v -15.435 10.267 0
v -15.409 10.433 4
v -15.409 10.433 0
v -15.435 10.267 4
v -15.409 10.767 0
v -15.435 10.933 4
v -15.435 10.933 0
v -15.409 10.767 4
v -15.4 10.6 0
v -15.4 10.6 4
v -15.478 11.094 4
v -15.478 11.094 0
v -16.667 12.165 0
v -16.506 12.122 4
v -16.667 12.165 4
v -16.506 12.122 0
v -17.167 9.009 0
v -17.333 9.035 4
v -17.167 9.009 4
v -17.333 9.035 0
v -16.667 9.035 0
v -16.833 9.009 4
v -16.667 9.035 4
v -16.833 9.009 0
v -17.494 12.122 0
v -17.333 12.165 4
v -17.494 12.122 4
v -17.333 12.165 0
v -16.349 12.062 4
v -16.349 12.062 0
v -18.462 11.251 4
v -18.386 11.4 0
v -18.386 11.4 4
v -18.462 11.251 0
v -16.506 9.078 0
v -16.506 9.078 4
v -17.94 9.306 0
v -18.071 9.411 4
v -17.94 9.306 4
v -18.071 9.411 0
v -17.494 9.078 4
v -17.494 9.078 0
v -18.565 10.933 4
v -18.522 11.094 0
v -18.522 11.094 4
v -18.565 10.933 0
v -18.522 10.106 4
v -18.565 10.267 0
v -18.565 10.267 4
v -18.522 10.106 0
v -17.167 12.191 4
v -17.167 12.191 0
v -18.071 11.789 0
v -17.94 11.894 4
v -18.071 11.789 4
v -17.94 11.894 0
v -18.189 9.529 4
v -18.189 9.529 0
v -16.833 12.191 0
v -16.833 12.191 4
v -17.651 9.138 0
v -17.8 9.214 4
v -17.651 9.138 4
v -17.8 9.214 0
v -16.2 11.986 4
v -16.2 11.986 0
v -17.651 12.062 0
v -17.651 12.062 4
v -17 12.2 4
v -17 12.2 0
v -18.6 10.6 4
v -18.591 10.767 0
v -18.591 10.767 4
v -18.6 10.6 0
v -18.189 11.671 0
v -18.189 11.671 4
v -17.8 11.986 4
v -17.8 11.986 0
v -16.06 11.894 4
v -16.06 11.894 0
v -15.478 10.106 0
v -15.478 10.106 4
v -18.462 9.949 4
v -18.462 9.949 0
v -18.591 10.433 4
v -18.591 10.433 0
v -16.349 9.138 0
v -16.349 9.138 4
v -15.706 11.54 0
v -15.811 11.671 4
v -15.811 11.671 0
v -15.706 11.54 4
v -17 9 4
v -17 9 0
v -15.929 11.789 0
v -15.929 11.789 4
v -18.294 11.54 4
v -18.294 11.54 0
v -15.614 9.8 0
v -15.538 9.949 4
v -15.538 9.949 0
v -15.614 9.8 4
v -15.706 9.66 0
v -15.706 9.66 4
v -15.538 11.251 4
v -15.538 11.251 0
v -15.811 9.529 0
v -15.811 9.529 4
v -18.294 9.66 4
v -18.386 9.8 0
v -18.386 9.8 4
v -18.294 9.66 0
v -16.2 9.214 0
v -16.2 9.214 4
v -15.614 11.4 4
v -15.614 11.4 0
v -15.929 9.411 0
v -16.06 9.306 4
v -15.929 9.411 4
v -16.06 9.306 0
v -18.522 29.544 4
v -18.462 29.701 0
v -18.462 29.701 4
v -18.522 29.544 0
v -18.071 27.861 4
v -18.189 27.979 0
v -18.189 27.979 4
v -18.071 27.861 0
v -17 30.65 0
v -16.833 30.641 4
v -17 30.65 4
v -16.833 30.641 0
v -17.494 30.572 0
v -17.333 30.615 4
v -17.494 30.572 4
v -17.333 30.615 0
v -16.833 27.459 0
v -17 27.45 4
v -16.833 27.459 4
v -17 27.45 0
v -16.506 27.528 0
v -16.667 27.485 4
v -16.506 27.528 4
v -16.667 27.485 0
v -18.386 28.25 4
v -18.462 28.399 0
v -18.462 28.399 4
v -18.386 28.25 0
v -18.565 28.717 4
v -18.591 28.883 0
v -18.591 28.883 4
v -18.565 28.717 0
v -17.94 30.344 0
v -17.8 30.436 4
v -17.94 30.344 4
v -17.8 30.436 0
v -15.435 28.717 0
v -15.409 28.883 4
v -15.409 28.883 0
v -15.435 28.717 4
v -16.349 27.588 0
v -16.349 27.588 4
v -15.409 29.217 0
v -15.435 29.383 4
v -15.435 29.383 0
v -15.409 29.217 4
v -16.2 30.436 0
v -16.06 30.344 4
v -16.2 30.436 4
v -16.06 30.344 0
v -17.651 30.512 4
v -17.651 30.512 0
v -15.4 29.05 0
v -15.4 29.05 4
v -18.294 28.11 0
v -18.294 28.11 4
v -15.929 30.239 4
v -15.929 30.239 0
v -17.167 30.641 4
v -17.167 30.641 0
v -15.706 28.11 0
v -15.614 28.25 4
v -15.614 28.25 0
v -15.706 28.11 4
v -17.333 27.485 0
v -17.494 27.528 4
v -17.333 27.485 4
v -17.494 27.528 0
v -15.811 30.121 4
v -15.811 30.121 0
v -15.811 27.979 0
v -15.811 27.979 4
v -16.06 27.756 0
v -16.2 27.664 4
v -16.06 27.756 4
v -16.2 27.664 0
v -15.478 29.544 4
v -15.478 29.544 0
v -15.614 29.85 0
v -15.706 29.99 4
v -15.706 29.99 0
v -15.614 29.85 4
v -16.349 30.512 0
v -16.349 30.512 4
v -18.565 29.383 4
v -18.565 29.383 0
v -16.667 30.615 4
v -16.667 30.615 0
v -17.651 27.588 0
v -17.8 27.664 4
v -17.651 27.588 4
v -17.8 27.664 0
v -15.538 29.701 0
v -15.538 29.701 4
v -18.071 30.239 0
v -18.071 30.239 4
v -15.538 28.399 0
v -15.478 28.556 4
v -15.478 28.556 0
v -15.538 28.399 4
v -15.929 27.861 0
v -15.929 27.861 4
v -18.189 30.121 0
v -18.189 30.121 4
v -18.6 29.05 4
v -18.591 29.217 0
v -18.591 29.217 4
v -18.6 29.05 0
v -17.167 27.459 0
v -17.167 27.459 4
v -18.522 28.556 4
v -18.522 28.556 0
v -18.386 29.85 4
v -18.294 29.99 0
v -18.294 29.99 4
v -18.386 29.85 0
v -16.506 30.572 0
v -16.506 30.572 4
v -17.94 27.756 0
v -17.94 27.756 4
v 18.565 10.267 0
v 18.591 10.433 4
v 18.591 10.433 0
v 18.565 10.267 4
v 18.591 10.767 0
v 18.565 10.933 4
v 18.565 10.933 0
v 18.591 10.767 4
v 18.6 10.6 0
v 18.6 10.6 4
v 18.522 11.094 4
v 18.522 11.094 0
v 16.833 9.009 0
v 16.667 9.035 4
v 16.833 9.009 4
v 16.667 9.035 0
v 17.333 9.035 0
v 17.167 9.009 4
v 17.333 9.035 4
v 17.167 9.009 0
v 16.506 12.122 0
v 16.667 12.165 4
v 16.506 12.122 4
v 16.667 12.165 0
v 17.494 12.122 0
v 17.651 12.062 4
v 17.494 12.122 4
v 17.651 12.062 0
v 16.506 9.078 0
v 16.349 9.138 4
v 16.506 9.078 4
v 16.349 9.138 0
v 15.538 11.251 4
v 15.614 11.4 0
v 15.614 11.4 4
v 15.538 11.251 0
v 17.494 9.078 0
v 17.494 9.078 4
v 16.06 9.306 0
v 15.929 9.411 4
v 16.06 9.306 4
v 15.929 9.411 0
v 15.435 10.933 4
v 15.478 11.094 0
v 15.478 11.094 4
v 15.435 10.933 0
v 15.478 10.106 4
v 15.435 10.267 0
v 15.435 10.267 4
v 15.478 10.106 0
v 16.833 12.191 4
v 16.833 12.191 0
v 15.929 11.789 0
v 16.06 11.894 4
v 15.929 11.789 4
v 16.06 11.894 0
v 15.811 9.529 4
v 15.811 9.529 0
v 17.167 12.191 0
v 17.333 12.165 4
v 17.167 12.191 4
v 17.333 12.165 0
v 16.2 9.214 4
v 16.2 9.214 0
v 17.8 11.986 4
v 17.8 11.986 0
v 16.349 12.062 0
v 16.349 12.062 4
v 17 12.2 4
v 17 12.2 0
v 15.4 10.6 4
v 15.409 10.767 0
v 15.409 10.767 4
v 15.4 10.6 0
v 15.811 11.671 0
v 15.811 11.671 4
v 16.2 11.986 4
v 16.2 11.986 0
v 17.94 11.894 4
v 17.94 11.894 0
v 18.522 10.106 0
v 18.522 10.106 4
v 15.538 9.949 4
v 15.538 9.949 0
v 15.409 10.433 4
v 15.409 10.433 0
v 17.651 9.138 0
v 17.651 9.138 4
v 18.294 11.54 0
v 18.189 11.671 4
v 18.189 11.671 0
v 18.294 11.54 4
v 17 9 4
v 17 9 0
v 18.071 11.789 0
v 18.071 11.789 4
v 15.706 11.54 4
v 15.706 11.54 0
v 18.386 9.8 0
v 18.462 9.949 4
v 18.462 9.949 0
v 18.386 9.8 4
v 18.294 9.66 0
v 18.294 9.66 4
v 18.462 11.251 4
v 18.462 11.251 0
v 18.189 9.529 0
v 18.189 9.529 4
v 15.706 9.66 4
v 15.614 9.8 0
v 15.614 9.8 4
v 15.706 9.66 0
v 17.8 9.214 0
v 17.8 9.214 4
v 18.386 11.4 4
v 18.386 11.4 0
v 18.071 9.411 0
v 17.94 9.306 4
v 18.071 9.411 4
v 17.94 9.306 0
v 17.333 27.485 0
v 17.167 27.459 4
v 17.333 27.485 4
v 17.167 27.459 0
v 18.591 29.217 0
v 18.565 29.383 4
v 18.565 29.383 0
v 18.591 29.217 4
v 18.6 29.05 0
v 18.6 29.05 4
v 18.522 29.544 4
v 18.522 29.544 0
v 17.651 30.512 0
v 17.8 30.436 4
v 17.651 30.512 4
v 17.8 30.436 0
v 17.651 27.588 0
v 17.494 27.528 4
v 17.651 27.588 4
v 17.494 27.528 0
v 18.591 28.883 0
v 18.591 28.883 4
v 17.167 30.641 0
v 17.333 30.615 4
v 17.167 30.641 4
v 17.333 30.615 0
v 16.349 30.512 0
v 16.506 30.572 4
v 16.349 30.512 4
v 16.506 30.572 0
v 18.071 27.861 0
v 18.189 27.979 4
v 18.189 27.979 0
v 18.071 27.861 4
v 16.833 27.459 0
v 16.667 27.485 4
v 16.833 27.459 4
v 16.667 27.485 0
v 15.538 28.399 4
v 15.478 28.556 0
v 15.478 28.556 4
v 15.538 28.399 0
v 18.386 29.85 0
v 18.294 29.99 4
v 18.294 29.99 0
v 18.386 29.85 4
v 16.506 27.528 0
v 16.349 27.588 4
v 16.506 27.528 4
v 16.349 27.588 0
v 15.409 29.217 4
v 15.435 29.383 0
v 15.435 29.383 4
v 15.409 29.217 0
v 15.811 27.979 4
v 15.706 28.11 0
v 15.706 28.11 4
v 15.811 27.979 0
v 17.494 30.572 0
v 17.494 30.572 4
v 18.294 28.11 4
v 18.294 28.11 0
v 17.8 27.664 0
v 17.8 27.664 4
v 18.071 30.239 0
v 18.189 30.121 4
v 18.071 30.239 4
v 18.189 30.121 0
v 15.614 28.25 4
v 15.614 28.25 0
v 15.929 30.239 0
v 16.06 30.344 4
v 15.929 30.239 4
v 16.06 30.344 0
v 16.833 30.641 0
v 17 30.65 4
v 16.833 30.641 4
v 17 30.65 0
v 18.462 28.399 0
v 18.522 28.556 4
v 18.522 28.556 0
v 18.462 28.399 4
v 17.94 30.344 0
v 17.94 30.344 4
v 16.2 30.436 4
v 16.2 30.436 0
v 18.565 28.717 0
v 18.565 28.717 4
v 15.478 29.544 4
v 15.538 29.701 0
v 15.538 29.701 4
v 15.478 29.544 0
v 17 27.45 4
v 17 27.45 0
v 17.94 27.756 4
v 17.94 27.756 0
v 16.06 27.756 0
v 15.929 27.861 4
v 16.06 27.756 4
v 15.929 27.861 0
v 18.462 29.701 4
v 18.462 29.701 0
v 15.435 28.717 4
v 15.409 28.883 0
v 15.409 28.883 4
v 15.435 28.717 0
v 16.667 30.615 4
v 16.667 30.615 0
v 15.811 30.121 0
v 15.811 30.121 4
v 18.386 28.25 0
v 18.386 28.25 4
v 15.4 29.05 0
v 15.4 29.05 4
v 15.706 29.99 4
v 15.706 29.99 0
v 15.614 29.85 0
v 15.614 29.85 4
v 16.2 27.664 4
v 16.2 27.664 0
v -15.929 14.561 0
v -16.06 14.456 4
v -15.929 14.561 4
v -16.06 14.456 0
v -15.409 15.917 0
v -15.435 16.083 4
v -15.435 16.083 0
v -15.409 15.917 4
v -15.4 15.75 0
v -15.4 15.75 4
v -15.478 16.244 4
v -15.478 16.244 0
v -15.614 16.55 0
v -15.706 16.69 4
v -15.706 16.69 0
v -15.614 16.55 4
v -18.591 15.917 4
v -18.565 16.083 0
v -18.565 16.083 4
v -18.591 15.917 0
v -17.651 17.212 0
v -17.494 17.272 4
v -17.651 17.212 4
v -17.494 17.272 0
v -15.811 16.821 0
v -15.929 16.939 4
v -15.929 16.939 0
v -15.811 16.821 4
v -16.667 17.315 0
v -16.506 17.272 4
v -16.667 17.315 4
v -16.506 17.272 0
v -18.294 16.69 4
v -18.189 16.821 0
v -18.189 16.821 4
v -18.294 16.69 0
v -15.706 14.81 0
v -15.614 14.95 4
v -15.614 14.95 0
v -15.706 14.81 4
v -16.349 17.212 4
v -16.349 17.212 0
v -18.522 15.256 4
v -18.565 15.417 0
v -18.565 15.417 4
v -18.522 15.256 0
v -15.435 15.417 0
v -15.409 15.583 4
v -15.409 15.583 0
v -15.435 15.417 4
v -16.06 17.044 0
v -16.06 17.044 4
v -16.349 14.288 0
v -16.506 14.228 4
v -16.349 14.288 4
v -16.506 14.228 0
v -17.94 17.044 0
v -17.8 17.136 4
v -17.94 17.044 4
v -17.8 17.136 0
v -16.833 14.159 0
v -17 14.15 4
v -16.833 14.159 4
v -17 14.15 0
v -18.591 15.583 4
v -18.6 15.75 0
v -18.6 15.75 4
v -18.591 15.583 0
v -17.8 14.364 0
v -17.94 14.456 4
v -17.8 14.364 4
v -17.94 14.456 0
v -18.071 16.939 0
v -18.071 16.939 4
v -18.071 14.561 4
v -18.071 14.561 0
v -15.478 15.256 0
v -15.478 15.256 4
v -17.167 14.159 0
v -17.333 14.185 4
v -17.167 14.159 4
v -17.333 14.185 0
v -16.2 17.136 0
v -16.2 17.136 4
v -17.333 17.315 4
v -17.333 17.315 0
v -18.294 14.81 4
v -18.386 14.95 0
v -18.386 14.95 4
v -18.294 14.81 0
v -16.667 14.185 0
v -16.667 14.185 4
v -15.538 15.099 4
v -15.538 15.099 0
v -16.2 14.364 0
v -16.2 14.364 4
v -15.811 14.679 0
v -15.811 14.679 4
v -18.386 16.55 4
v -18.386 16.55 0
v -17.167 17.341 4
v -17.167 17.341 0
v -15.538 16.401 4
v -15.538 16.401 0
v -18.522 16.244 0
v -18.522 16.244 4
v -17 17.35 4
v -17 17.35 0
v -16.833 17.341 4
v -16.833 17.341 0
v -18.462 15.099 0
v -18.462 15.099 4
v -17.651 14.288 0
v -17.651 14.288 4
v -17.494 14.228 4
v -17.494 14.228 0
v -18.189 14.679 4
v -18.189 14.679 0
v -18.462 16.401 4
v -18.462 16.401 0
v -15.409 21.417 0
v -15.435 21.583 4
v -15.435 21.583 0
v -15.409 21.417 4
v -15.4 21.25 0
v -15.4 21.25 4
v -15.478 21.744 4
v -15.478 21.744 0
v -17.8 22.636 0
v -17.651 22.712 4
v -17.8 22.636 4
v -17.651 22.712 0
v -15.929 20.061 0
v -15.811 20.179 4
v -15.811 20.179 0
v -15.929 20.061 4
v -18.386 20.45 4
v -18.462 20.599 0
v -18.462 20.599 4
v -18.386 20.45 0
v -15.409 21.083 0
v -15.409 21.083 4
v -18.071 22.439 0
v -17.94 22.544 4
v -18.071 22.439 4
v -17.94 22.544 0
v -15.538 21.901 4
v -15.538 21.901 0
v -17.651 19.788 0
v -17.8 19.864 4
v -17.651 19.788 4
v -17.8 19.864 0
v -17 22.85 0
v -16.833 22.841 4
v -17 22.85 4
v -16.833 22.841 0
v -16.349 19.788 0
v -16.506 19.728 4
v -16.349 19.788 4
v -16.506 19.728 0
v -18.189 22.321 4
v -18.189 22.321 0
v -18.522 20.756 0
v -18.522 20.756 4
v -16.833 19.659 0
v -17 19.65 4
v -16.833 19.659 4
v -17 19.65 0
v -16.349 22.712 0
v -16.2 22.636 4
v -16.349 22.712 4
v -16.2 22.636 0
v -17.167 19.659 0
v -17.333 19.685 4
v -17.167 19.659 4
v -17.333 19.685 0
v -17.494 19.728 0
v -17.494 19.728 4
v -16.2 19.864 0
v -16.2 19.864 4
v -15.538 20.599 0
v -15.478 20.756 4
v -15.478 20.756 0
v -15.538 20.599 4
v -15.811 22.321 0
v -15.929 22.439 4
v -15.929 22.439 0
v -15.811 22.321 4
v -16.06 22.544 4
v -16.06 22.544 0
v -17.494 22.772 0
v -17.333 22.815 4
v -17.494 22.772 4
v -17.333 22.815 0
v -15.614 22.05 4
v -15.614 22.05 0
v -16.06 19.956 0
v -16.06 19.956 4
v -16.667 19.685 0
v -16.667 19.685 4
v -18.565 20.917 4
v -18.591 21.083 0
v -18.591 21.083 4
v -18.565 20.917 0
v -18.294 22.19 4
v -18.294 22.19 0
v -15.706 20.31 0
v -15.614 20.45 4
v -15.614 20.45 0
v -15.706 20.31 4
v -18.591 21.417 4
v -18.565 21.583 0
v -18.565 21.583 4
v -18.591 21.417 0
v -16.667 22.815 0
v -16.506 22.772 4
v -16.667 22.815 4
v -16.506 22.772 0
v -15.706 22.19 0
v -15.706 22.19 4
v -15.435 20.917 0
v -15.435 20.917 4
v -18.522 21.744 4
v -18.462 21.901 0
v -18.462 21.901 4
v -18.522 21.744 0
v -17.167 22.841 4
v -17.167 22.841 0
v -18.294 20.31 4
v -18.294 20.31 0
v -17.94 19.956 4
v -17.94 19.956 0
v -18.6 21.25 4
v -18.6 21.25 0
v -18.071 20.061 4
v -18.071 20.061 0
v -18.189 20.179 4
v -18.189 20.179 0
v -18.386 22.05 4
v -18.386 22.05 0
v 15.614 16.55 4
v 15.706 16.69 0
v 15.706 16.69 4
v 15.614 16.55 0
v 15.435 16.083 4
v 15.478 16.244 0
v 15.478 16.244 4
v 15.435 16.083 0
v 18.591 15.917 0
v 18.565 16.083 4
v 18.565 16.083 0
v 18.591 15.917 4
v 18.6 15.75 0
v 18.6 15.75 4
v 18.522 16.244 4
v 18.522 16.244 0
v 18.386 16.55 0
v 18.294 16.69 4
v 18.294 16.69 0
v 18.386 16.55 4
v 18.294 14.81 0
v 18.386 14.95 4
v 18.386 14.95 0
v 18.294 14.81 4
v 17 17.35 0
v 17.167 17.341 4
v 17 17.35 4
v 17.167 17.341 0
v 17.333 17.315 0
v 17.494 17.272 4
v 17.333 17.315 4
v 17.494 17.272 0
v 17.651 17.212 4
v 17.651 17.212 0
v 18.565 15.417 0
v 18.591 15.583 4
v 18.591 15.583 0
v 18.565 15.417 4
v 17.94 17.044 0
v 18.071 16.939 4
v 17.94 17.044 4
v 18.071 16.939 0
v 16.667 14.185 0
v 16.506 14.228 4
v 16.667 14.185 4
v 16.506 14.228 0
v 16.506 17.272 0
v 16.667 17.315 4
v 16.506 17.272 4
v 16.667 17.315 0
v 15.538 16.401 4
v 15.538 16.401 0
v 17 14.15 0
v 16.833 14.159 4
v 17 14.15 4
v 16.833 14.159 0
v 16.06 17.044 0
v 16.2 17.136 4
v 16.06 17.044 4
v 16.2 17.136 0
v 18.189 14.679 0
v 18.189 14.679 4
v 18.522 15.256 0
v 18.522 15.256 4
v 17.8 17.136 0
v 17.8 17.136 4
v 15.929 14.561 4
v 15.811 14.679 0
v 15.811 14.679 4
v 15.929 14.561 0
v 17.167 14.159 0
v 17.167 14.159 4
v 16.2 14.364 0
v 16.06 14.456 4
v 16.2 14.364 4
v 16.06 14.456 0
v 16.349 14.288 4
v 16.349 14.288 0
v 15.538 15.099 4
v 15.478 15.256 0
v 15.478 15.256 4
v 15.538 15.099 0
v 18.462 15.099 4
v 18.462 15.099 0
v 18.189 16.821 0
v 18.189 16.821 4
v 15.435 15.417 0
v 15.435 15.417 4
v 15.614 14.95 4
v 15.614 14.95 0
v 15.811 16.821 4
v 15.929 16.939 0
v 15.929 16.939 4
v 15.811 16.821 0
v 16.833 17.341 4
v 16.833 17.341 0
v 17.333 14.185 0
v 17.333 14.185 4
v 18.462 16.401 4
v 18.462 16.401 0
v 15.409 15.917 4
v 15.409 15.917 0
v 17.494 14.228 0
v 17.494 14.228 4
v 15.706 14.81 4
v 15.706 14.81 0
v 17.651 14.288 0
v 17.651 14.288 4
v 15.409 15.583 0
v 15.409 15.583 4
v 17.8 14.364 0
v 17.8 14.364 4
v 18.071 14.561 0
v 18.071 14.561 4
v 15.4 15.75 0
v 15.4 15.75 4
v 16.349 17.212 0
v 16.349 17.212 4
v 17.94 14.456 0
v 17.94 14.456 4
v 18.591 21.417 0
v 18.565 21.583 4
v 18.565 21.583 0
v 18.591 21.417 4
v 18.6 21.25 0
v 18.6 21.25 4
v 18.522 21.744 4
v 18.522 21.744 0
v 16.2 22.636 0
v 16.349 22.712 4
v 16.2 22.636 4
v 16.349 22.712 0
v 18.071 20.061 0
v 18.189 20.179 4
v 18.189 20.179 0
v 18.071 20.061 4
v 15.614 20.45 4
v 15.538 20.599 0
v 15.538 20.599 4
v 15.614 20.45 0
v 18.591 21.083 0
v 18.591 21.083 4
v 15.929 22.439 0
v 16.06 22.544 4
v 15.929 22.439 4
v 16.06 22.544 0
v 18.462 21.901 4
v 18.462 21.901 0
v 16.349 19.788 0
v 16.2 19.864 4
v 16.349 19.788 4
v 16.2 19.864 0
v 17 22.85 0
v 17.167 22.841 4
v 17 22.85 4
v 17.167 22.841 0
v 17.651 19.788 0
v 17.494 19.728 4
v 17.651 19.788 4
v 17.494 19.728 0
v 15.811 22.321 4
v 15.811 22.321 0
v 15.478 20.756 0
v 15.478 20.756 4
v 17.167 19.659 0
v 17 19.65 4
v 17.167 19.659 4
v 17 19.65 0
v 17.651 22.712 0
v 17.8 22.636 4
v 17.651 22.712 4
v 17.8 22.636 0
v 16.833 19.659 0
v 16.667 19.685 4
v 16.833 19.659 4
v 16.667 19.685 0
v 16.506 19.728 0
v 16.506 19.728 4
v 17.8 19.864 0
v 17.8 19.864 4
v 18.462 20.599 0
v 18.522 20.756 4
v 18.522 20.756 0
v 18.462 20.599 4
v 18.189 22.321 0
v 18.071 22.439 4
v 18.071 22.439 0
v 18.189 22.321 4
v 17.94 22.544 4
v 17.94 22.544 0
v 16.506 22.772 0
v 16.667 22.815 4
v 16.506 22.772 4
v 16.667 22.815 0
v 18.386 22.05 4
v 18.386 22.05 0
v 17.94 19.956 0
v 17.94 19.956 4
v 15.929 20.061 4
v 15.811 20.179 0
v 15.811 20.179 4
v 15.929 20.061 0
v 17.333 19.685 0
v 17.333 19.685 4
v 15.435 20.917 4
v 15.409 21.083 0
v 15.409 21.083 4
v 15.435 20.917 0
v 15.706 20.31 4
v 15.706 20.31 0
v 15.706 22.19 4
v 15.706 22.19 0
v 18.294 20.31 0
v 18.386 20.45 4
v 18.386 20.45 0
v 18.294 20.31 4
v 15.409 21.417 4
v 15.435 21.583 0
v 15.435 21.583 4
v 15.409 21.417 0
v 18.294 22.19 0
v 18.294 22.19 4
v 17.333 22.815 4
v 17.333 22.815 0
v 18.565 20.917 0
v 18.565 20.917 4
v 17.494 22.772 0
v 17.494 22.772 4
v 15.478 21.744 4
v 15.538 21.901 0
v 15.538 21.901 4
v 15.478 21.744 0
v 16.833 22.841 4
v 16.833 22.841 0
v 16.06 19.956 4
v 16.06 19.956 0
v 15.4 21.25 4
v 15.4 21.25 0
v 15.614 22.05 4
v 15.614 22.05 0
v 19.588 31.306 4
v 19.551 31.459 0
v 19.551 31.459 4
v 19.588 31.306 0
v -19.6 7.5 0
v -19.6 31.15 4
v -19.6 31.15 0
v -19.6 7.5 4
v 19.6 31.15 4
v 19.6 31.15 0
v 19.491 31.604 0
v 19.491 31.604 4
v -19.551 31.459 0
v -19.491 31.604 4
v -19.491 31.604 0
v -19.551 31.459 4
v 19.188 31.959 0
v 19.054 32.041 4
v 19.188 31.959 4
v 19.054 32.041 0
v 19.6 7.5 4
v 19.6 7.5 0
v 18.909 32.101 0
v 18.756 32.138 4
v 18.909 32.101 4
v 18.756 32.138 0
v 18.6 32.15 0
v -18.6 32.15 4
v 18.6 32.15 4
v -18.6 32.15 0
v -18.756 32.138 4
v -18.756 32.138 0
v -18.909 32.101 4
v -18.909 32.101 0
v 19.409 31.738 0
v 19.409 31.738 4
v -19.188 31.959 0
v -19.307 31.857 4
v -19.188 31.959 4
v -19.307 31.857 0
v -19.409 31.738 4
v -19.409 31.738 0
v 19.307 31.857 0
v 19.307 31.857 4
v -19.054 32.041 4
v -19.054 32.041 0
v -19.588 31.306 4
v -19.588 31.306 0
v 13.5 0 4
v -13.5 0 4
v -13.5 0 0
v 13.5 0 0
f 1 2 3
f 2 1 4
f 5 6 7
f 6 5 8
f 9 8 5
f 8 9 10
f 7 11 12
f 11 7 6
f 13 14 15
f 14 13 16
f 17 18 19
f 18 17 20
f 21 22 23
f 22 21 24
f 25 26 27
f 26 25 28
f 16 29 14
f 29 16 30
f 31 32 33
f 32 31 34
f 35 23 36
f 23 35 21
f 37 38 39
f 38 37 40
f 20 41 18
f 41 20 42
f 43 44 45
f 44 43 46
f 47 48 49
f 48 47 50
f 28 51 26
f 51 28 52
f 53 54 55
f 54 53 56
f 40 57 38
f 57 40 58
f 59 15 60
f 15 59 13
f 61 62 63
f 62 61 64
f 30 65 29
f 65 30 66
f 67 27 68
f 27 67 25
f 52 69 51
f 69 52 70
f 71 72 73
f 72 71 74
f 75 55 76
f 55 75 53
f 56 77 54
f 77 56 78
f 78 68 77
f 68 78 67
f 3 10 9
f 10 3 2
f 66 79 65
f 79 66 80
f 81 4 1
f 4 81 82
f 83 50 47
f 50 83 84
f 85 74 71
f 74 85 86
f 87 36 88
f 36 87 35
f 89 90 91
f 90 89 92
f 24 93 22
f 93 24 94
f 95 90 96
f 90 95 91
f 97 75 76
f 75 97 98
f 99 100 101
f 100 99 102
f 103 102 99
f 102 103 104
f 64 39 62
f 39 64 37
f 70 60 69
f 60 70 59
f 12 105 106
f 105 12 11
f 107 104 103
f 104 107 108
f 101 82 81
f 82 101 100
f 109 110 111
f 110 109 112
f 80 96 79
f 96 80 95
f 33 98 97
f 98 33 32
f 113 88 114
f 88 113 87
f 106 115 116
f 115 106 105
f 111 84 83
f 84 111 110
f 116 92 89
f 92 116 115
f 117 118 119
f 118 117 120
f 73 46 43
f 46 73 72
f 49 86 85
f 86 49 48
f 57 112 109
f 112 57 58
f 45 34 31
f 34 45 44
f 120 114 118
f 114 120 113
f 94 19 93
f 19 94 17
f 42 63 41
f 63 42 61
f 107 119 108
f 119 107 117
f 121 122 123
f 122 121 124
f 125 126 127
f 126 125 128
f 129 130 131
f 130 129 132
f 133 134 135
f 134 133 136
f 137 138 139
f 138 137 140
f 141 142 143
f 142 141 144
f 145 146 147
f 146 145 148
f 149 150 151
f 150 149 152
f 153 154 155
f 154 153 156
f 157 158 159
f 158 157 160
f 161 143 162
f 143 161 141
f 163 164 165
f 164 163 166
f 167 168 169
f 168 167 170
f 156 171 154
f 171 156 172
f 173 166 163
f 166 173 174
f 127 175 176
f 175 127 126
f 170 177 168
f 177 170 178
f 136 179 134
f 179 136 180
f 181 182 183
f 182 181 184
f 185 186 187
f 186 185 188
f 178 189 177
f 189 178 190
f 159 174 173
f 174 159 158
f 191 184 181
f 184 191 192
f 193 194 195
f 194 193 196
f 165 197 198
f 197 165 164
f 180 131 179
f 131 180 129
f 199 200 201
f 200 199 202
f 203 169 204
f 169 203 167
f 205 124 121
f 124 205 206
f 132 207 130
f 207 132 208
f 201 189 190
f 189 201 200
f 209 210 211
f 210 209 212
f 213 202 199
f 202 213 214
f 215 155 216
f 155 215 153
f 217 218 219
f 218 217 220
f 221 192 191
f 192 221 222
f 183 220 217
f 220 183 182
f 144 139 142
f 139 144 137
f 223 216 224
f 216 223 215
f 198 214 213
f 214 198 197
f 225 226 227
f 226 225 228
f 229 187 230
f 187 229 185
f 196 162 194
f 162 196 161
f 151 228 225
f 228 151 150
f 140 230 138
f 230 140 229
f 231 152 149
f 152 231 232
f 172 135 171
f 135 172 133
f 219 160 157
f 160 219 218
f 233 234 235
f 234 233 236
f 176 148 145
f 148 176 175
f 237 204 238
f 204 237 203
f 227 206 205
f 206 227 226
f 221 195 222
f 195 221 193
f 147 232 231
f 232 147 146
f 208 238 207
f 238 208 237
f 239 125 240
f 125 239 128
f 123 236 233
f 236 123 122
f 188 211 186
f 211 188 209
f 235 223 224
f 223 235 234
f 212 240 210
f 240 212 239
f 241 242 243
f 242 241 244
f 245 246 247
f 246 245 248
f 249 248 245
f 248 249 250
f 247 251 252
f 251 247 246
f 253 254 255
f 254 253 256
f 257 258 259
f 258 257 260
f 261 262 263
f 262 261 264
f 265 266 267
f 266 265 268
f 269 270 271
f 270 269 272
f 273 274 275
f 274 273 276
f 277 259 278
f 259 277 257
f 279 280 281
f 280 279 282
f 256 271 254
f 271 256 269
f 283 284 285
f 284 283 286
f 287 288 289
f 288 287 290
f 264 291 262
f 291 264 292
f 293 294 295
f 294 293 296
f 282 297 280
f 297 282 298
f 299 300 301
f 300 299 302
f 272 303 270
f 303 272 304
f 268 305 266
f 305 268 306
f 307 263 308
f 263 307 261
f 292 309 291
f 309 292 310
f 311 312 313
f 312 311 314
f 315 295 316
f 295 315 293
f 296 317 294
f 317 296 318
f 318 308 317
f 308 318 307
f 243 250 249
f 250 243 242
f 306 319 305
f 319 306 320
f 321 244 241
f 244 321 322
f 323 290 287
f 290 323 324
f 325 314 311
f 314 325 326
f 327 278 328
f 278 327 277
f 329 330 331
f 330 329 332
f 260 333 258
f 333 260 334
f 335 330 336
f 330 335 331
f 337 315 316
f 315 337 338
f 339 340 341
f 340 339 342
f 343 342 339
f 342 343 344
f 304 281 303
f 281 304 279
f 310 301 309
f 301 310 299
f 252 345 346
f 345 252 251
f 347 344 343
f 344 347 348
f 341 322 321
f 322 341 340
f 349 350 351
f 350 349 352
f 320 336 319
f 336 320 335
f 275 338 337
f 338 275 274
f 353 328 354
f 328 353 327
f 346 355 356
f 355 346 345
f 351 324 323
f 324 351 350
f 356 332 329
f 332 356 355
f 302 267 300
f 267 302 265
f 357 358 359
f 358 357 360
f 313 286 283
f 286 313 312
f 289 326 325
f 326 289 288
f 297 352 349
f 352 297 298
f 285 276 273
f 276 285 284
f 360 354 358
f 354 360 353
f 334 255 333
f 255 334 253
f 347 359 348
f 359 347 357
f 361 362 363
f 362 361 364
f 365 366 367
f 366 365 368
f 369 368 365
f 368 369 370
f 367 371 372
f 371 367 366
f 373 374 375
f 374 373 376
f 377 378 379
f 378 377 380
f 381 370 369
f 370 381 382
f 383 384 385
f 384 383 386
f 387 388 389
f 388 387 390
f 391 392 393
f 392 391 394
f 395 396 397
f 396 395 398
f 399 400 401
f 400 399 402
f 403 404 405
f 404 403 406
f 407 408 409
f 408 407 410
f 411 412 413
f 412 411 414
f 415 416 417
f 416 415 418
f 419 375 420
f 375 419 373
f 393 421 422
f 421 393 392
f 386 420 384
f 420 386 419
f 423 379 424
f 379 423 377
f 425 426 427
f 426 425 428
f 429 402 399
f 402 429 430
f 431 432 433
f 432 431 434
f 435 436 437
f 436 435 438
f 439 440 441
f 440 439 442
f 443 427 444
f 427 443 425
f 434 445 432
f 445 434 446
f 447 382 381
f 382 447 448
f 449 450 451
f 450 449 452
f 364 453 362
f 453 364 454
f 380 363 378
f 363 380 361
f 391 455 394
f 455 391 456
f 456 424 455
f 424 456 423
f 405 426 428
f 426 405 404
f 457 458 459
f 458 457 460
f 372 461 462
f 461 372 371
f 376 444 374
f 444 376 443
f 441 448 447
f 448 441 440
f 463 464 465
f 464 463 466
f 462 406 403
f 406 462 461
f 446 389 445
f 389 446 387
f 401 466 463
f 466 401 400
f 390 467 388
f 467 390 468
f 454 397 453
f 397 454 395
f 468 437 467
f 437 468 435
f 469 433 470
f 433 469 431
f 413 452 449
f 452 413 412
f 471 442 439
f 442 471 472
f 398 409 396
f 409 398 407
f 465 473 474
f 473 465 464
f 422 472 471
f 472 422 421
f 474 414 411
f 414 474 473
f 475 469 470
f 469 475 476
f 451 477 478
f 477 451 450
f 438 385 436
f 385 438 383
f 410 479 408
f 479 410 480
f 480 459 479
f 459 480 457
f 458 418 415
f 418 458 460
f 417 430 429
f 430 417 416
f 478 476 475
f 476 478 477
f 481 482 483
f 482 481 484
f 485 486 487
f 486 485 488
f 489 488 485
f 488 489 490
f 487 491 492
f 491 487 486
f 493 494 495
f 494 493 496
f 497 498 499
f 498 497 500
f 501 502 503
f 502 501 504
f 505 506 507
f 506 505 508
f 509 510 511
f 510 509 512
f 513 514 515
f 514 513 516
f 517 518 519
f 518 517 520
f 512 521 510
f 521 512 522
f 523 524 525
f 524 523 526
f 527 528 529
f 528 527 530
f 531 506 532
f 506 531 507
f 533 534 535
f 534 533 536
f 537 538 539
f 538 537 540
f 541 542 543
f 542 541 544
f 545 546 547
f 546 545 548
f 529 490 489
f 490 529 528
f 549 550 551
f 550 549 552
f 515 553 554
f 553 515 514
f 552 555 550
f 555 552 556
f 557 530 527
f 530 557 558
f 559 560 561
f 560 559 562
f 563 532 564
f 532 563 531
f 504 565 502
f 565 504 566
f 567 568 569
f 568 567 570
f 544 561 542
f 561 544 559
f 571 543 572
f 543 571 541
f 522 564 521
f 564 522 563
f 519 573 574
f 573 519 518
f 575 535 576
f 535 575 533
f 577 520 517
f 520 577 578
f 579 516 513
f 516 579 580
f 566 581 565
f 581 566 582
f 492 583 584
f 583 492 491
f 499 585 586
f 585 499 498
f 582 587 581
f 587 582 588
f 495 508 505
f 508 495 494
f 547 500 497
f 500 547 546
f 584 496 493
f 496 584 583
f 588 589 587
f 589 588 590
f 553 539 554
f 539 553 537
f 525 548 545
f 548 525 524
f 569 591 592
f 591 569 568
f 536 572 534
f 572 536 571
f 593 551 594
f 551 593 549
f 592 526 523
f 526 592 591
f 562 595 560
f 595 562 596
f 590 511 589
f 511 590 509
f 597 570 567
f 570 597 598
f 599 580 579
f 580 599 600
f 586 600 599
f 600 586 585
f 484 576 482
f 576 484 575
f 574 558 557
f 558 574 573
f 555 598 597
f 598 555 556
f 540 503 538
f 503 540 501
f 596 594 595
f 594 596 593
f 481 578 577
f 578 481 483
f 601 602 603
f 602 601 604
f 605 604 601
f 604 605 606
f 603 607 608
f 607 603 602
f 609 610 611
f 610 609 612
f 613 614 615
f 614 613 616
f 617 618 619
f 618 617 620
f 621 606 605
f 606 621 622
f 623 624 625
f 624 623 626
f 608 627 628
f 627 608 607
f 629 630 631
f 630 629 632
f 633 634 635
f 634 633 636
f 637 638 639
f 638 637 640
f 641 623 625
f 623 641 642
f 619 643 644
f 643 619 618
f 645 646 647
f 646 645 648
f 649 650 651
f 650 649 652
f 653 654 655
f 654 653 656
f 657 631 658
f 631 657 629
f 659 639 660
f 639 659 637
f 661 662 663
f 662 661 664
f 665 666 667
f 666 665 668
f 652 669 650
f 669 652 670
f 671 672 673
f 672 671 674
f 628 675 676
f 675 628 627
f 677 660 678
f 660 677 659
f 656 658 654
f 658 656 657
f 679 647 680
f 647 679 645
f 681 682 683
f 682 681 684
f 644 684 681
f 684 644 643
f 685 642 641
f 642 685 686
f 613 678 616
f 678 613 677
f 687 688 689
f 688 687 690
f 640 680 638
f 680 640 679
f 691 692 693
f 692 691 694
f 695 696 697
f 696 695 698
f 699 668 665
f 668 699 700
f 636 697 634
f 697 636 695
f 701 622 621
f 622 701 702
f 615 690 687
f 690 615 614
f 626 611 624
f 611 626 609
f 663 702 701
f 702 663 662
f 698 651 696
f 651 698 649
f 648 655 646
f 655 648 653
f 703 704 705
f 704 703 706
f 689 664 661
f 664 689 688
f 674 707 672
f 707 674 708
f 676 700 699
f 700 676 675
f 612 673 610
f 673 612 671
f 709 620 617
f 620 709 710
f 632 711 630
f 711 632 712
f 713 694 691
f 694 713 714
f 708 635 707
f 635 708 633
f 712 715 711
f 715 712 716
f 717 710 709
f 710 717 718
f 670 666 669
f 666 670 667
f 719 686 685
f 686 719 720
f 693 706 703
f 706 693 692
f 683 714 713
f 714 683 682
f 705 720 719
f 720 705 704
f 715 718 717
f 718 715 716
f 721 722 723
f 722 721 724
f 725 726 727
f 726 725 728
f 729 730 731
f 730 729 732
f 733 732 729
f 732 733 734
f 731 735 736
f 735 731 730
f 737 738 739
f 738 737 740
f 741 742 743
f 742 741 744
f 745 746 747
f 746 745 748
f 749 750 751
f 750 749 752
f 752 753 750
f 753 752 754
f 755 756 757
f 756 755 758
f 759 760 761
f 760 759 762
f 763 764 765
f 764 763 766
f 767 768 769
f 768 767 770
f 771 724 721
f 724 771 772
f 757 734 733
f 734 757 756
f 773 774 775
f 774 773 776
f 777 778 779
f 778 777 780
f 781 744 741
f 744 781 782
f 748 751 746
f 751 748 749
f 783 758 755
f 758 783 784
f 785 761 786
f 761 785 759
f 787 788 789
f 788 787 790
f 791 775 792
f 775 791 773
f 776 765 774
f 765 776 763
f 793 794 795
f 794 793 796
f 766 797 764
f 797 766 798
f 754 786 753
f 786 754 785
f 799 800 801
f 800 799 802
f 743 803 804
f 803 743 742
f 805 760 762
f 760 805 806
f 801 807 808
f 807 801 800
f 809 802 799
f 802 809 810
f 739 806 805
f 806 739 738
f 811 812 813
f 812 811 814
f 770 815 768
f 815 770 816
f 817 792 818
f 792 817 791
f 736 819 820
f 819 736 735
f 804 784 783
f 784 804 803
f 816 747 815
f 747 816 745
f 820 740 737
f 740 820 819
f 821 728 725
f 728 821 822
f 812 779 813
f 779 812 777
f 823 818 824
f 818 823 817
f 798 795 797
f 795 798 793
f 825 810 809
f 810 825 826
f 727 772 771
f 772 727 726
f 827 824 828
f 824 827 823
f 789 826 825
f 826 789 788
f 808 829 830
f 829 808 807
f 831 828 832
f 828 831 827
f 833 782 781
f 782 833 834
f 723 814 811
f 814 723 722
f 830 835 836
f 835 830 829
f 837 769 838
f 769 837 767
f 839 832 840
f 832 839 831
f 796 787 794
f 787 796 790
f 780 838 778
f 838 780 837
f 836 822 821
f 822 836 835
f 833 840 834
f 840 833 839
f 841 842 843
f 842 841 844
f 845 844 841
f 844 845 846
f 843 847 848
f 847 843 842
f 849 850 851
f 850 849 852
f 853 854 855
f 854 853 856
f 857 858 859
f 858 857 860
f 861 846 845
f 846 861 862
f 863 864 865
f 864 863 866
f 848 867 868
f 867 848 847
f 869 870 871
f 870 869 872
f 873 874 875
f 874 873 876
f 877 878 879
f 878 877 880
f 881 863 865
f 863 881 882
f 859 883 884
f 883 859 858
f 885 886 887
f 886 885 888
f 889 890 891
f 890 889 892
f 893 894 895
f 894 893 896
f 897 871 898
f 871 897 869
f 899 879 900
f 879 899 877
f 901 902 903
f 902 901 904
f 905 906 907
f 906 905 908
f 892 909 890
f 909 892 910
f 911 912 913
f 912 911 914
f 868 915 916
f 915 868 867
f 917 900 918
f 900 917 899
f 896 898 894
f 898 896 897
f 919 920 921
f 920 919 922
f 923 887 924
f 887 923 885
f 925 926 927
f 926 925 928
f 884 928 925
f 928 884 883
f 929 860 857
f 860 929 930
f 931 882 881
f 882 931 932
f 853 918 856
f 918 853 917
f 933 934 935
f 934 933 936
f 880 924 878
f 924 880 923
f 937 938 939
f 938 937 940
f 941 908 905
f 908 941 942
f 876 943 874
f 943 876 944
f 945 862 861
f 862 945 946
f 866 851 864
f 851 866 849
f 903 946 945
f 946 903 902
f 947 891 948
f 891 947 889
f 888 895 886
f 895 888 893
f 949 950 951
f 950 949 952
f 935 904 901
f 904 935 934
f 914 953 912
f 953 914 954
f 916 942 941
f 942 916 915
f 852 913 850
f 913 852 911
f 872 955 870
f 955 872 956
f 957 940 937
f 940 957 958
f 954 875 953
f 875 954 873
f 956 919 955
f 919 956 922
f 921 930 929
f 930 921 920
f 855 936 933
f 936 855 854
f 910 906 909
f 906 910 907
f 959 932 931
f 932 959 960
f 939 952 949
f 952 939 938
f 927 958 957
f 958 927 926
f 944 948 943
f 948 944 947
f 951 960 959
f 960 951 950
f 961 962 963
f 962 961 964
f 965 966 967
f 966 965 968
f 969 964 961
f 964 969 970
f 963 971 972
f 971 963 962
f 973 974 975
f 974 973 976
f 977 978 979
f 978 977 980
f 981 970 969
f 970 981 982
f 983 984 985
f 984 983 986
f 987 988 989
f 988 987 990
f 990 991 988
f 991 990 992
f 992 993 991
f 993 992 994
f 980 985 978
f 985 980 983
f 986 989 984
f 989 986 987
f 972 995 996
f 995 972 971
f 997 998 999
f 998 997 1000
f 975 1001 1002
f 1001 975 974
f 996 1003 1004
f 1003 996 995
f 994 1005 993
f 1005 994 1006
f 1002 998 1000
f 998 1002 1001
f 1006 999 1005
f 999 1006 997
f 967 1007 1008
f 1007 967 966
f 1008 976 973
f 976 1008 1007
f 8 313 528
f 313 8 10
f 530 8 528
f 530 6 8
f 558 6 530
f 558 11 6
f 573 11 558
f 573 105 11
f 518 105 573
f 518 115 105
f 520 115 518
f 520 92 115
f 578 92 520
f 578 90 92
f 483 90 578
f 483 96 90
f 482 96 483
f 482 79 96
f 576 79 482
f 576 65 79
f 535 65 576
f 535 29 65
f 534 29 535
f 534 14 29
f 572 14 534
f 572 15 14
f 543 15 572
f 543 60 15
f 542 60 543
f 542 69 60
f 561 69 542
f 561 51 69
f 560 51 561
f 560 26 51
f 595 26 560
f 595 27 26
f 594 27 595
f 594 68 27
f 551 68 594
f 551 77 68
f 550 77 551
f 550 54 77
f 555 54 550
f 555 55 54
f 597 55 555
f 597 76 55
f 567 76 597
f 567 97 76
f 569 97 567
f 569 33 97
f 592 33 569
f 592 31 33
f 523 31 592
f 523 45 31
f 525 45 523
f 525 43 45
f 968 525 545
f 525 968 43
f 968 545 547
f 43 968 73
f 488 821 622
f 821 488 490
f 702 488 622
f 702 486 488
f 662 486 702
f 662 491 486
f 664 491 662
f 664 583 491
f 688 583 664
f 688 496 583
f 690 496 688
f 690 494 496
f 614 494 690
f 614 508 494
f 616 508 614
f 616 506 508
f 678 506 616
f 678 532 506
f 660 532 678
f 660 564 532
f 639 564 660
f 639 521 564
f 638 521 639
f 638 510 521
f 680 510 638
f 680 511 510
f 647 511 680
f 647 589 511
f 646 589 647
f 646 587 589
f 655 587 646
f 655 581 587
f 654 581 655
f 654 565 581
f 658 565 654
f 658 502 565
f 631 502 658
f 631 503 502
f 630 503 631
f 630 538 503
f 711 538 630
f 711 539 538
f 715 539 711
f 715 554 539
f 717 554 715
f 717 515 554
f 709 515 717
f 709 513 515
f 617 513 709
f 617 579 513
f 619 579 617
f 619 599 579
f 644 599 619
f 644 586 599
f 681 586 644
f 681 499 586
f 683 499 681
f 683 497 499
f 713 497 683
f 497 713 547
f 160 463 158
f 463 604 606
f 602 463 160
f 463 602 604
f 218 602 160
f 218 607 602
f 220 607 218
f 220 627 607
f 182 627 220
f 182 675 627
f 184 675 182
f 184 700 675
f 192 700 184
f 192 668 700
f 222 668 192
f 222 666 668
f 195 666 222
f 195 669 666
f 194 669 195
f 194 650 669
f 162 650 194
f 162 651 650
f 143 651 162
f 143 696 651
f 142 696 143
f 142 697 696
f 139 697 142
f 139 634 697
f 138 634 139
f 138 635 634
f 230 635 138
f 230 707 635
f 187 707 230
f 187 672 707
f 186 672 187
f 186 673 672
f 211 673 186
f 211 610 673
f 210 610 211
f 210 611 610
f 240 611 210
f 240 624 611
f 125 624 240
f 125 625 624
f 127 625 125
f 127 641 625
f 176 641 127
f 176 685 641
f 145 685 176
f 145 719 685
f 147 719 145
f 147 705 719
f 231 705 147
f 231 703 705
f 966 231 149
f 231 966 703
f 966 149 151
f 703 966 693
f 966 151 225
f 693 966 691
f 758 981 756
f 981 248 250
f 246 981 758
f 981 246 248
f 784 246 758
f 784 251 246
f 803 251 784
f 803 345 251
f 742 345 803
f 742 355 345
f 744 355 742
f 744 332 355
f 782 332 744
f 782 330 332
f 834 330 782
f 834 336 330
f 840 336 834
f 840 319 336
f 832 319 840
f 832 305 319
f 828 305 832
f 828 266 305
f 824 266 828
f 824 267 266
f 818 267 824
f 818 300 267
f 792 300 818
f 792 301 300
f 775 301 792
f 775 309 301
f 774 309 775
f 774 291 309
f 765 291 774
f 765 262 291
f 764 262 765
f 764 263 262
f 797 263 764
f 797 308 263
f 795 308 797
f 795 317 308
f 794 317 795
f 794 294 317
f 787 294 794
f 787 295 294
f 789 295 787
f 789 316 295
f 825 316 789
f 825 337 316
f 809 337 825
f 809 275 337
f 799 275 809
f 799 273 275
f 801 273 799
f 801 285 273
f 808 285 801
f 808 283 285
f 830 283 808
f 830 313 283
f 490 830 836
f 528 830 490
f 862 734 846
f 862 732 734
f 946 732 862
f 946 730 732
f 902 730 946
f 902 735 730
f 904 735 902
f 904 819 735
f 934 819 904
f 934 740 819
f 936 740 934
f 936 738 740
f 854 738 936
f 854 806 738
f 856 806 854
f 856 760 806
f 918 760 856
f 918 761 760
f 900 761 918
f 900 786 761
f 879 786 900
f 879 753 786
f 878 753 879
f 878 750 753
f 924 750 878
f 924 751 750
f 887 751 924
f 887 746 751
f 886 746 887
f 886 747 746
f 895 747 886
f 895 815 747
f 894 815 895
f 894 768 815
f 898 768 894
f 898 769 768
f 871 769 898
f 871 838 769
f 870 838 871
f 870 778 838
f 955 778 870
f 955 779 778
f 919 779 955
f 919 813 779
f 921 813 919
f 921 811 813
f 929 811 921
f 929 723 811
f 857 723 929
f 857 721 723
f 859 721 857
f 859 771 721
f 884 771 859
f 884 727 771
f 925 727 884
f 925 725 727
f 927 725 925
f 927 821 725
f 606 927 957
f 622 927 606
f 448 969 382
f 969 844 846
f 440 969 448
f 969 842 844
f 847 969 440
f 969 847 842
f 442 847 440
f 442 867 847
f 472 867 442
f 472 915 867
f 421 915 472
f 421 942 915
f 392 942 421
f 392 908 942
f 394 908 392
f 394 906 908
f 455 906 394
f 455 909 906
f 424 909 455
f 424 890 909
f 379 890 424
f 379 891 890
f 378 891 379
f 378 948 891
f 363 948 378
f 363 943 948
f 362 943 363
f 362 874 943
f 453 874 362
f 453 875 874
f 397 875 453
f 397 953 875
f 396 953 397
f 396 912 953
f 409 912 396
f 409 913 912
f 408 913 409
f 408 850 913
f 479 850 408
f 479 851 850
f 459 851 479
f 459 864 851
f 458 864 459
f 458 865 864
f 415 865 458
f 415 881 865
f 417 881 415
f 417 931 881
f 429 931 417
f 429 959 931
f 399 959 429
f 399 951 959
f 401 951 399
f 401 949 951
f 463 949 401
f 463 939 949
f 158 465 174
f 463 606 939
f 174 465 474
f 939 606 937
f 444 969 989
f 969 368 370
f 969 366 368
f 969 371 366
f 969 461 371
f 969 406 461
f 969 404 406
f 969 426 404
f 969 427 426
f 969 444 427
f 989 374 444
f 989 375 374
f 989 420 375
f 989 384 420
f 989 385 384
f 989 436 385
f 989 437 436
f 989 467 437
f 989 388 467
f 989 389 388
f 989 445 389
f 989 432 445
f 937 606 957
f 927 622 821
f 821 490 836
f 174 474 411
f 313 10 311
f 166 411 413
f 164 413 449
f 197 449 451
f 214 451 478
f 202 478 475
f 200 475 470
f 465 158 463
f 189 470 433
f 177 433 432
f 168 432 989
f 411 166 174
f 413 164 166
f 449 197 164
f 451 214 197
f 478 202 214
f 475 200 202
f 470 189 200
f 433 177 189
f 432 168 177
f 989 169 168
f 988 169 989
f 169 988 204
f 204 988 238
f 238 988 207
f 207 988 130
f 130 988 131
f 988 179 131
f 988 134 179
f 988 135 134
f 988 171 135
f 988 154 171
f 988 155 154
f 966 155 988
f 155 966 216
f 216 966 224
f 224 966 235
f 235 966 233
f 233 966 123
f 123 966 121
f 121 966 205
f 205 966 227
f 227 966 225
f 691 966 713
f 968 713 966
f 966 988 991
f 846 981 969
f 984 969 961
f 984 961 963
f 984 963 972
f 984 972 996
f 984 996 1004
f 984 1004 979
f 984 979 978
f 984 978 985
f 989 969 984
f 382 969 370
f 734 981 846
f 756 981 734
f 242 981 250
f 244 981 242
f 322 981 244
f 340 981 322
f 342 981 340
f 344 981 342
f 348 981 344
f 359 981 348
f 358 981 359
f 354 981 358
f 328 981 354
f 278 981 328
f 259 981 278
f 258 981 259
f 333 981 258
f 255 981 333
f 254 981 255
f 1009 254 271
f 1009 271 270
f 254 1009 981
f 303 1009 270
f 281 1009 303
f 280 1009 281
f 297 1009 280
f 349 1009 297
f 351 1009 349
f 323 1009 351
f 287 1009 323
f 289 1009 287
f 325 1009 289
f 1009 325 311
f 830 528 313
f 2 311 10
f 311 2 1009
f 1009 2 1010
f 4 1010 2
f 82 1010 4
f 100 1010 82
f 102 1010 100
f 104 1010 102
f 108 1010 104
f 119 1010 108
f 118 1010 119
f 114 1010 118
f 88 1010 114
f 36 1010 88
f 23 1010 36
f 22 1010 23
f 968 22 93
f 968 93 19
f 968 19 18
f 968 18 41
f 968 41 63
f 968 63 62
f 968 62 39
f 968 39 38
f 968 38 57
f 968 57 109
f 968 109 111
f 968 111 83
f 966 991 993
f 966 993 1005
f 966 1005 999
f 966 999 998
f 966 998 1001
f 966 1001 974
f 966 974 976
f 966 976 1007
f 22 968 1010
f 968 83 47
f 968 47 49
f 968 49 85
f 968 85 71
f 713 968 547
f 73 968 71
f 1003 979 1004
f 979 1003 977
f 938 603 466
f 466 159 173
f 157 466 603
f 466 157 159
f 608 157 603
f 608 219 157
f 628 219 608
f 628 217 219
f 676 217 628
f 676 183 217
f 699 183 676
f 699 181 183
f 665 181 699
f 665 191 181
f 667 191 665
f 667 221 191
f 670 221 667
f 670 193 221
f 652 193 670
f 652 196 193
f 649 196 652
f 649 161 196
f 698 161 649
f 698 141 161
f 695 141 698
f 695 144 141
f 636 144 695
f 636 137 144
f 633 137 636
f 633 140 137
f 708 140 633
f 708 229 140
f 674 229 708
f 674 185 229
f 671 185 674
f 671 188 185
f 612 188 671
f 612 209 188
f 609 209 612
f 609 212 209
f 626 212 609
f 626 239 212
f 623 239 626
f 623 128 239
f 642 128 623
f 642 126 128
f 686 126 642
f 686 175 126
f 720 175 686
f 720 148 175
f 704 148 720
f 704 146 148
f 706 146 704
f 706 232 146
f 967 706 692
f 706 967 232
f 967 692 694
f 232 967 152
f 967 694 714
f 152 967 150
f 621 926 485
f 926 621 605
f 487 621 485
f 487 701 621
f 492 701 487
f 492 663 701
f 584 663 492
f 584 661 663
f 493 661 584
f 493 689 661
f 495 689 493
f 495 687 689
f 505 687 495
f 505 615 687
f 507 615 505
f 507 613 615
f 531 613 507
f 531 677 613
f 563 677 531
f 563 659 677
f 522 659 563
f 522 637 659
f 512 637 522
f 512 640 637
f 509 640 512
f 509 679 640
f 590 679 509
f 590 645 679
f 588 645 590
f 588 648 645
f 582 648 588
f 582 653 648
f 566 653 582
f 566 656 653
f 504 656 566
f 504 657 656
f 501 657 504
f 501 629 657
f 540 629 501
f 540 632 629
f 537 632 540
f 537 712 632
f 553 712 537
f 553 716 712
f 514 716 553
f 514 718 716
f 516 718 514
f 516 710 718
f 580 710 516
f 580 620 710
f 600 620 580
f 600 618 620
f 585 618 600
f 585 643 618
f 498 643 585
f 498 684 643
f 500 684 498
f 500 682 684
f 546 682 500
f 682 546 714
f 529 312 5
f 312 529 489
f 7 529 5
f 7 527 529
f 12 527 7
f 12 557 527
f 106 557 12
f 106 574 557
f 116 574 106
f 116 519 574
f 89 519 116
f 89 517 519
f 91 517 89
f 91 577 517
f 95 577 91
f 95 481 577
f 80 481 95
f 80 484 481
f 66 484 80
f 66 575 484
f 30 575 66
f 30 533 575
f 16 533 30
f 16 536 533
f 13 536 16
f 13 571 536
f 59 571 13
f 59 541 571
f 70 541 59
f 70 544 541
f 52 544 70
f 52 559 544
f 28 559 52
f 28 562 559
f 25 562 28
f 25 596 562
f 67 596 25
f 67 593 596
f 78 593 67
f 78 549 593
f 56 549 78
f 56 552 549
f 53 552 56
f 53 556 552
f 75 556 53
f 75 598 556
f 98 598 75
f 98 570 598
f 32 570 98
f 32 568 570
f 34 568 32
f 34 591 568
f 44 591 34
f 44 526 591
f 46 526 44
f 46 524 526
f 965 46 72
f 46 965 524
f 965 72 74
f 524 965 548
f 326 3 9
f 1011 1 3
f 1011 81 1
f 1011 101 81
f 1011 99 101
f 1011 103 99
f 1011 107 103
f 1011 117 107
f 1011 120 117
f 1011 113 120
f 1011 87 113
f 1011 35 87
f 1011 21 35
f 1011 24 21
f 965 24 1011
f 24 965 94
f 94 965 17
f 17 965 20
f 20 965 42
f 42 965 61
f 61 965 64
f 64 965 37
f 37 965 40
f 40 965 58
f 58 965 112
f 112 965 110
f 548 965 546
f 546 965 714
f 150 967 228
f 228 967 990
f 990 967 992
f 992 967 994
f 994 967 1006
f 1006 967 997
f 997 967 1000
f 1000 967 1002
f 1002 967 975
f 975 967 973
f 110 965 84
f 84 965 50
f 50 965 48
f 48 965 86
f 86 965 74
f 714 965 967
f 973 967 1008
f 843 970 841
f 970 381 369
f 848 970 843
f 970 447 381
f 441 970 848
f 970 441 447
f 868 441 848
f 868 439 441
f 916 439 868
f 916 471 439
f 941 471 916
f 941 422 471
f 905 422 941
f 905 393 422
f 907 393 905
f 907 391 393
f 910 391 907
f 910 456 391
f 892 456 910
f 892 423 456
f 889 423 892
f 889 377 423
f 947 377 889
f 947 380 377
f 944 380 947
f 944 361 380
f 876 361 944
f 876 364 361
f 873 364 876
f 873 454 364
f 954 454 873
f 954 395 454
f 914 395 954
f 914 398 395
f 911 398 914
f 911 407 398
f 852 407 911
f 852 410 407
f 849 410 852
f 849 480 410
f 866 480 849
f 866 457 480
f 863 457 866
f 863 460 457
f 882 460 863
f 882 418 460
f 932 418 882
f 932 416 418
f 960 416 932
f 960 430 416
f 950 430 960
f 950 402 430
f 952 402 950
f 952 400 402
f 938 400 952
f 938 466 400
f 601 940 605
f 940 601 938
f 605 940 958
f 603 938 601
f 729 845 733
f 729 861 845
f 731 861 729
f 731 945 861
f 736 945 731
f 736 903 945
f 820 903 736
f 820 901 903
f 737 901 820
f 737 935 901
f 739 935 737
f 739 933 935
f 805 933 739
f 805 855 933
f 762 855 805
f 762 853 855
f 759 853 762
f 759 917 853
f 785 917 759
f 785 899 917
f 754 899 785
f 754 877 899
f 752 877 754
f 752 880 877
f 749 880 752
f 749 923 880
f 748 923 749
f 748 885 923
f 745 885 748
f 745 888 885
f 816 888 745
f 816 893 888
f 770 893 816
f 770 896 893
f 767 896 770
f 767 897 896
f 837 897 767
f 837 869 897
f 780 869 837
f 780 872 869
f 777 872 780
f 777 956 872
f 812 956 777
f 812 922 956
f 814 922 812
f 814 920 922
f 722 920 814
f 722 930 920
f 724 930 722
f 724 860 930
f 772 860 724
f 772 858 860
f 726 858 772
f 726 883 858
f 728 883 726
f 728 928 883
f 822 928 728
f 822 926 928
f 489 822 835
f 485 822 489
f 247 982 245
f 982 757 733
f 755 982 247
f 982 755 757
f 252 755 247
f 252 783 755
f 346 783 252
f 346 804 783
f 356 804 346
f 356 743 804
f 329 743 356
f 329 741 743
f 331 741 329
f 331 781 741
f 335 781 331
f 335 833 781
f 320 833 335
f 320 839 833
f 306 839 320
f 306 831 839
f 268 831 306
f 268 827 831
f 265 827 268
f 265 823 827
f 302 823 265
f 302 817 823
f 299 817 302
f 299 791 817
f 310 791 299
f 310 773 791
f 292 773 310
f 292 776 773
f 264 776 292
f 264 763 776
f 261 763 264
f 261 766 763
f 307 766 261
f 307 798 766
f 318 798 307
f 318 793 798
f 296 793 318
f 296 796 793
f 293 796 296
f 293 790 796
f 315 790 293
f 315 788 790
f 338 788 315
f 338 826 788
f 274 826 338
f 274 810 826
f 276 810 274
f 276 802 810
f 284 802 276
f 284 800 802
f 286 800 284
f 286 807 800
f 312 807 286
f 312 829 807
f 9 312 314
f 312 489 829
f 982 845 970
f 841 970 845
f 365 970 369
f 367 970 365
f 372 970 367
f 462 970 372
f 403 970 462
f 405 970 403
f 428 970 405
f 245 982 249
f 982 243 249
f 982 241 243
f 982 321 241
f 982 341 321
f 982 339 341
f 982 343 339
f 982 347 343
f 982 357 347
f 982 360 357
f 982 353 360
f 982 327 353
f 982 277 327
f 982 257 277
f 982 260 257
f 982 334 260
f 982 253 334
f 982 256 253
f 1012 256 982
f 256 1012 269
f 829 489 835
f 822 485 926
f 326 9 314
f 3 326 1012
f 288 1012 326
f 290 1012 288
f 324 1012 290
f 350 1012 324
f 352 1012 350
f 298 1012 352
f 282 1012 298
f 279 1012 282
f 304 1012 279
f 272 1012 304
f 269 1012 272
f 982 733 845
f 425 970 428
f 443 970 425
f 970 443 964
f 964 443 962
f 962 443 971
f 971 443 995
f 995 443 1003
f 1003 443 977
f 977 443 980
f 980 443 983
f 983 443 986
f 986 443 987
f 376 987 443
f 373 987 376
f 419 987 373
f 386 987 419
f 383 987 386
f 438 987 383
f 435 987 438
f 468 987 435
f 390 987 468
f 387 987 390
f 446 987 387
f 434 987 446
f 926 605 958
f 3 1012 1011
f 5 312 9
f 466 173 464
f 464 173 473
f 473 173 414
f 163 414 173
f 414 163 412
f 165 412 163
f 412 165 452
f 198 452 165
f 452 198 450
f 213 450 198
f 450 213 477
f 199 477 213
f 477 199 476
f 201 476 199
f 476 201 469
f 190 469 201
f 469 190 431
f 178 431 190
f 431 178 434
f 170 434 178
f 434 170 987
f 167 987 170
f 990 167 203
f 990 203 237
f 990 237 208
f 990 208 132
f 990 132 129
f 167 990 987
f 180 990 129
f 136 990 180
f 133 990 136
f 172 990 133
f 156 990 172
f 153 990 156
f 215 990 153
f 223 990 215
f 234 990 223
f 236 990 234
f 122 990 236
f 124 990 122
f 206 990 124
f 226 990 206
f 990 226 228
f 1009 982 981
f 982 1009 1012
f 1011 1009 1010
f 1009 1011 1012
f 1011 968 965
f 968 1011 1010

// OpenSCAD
include <../colors.scad>
include <../parameters.scad>
include <../steering_params.scad>

use <../lib/functions.scad>
use <../lib/shapes2d.scad>
use <../lib/shapes3d.scad>
use <../lib/slots.scad>
use <../lib/transforms.scad>
use <../lib/trapezoids.scad>

function lower_arm_mount_base_size(outer_spacing=lower_arm_chassis_mount_bolt_spacing_outer,
                                   d=lower_arm_chassis_mount_bolt_d,
                                   padding_x=chassis_center_mount_padding_x,
                                   padding_y=chassis_center_mount_padding_y) =
  let (size_x=outer_spacing[0] + d + padding_x,
       size_y=outer_spacing[1] + d + padding_y)
  [size_x, size_y];

module lower_arm_mount_slots(outer_spacing=lower_arm_chassis_mount_bolt_spacing_outer,
                             inner_spacing=lower_arm_chassis_mount_bolt_spacing_inner,
                             d=lower_arm_chassis_mount_bolt_d,
                             h=upper_chassis_t,
                             padding=lower_arm_chassis_mount_bolt_outer_padding,
                             center_x=true,
                             center_y=true) {

  maybe_translate([center_x ? -outer_spacing[0] / 2 - d / 2 : 0,
                   center_y ? -outer_spacing[1] / 2 - d / 2 : 0,
                   0]) {
    four_corner_counterbores(size=outer_spacing,
                             d=d,
                             h=h,
                             sink=true,
                             center=false);

    translate([0, outer_spacing[1] - inner_spacing[1] - d - padding, 0]) {
      four_corner_counterbores(size=inner_spacing,
                               d=d,
                               h=h,
                               sink=true,
                               center=false);
    }
  }
}

module lower_arm_mount_bar_base(outer_spacing=lower_arm_chassis_mount_bolt_spacing_outer,
                                d=lower_arm_chassis_mount_bolt_d,
                                padding_x=chassis_center_mount_padding_x,
                                padding_y=chassis_center_mount_padding_y,
                                transition_w=chassis_center_transition_w,
                                transition_len=chassis_center_transition_len,
                                h=upper_chassis_t) {

  size = lower_arm_mount_base_size(outer_spacing=outer_spacing,
                                   d=d,
                                   padding_x=padding_x,
                                   padding_y=padding_y);
  size_x = size[0];
  size_y = size[1];

  translate([0, size_y / 2 + transition_len, 0]) {
    union() {
      difference() {
        linear_extrude(height=h, center=false) {
          rounded_rect(size,
                       r=1,
                       side="top",
                       center=true);
        }

        lower_arm_mount_slots(center_x=true,
                              center_y=true,
                              outer_spacing=outer_spacing,
                              h=h,
                              d=d);
      }
      translate([0, -size_y / 2 - transition_len / 2, 0]) {
        linear_extrude(height=h, center=false) {
          trapezoid(b=transition_w, h=transition_len, t=size_x, center=true);
        }
      }
    }
  }
}

// lower_arm_mount_slots(center_y=false);

lower_arm_mount_bar_base();
